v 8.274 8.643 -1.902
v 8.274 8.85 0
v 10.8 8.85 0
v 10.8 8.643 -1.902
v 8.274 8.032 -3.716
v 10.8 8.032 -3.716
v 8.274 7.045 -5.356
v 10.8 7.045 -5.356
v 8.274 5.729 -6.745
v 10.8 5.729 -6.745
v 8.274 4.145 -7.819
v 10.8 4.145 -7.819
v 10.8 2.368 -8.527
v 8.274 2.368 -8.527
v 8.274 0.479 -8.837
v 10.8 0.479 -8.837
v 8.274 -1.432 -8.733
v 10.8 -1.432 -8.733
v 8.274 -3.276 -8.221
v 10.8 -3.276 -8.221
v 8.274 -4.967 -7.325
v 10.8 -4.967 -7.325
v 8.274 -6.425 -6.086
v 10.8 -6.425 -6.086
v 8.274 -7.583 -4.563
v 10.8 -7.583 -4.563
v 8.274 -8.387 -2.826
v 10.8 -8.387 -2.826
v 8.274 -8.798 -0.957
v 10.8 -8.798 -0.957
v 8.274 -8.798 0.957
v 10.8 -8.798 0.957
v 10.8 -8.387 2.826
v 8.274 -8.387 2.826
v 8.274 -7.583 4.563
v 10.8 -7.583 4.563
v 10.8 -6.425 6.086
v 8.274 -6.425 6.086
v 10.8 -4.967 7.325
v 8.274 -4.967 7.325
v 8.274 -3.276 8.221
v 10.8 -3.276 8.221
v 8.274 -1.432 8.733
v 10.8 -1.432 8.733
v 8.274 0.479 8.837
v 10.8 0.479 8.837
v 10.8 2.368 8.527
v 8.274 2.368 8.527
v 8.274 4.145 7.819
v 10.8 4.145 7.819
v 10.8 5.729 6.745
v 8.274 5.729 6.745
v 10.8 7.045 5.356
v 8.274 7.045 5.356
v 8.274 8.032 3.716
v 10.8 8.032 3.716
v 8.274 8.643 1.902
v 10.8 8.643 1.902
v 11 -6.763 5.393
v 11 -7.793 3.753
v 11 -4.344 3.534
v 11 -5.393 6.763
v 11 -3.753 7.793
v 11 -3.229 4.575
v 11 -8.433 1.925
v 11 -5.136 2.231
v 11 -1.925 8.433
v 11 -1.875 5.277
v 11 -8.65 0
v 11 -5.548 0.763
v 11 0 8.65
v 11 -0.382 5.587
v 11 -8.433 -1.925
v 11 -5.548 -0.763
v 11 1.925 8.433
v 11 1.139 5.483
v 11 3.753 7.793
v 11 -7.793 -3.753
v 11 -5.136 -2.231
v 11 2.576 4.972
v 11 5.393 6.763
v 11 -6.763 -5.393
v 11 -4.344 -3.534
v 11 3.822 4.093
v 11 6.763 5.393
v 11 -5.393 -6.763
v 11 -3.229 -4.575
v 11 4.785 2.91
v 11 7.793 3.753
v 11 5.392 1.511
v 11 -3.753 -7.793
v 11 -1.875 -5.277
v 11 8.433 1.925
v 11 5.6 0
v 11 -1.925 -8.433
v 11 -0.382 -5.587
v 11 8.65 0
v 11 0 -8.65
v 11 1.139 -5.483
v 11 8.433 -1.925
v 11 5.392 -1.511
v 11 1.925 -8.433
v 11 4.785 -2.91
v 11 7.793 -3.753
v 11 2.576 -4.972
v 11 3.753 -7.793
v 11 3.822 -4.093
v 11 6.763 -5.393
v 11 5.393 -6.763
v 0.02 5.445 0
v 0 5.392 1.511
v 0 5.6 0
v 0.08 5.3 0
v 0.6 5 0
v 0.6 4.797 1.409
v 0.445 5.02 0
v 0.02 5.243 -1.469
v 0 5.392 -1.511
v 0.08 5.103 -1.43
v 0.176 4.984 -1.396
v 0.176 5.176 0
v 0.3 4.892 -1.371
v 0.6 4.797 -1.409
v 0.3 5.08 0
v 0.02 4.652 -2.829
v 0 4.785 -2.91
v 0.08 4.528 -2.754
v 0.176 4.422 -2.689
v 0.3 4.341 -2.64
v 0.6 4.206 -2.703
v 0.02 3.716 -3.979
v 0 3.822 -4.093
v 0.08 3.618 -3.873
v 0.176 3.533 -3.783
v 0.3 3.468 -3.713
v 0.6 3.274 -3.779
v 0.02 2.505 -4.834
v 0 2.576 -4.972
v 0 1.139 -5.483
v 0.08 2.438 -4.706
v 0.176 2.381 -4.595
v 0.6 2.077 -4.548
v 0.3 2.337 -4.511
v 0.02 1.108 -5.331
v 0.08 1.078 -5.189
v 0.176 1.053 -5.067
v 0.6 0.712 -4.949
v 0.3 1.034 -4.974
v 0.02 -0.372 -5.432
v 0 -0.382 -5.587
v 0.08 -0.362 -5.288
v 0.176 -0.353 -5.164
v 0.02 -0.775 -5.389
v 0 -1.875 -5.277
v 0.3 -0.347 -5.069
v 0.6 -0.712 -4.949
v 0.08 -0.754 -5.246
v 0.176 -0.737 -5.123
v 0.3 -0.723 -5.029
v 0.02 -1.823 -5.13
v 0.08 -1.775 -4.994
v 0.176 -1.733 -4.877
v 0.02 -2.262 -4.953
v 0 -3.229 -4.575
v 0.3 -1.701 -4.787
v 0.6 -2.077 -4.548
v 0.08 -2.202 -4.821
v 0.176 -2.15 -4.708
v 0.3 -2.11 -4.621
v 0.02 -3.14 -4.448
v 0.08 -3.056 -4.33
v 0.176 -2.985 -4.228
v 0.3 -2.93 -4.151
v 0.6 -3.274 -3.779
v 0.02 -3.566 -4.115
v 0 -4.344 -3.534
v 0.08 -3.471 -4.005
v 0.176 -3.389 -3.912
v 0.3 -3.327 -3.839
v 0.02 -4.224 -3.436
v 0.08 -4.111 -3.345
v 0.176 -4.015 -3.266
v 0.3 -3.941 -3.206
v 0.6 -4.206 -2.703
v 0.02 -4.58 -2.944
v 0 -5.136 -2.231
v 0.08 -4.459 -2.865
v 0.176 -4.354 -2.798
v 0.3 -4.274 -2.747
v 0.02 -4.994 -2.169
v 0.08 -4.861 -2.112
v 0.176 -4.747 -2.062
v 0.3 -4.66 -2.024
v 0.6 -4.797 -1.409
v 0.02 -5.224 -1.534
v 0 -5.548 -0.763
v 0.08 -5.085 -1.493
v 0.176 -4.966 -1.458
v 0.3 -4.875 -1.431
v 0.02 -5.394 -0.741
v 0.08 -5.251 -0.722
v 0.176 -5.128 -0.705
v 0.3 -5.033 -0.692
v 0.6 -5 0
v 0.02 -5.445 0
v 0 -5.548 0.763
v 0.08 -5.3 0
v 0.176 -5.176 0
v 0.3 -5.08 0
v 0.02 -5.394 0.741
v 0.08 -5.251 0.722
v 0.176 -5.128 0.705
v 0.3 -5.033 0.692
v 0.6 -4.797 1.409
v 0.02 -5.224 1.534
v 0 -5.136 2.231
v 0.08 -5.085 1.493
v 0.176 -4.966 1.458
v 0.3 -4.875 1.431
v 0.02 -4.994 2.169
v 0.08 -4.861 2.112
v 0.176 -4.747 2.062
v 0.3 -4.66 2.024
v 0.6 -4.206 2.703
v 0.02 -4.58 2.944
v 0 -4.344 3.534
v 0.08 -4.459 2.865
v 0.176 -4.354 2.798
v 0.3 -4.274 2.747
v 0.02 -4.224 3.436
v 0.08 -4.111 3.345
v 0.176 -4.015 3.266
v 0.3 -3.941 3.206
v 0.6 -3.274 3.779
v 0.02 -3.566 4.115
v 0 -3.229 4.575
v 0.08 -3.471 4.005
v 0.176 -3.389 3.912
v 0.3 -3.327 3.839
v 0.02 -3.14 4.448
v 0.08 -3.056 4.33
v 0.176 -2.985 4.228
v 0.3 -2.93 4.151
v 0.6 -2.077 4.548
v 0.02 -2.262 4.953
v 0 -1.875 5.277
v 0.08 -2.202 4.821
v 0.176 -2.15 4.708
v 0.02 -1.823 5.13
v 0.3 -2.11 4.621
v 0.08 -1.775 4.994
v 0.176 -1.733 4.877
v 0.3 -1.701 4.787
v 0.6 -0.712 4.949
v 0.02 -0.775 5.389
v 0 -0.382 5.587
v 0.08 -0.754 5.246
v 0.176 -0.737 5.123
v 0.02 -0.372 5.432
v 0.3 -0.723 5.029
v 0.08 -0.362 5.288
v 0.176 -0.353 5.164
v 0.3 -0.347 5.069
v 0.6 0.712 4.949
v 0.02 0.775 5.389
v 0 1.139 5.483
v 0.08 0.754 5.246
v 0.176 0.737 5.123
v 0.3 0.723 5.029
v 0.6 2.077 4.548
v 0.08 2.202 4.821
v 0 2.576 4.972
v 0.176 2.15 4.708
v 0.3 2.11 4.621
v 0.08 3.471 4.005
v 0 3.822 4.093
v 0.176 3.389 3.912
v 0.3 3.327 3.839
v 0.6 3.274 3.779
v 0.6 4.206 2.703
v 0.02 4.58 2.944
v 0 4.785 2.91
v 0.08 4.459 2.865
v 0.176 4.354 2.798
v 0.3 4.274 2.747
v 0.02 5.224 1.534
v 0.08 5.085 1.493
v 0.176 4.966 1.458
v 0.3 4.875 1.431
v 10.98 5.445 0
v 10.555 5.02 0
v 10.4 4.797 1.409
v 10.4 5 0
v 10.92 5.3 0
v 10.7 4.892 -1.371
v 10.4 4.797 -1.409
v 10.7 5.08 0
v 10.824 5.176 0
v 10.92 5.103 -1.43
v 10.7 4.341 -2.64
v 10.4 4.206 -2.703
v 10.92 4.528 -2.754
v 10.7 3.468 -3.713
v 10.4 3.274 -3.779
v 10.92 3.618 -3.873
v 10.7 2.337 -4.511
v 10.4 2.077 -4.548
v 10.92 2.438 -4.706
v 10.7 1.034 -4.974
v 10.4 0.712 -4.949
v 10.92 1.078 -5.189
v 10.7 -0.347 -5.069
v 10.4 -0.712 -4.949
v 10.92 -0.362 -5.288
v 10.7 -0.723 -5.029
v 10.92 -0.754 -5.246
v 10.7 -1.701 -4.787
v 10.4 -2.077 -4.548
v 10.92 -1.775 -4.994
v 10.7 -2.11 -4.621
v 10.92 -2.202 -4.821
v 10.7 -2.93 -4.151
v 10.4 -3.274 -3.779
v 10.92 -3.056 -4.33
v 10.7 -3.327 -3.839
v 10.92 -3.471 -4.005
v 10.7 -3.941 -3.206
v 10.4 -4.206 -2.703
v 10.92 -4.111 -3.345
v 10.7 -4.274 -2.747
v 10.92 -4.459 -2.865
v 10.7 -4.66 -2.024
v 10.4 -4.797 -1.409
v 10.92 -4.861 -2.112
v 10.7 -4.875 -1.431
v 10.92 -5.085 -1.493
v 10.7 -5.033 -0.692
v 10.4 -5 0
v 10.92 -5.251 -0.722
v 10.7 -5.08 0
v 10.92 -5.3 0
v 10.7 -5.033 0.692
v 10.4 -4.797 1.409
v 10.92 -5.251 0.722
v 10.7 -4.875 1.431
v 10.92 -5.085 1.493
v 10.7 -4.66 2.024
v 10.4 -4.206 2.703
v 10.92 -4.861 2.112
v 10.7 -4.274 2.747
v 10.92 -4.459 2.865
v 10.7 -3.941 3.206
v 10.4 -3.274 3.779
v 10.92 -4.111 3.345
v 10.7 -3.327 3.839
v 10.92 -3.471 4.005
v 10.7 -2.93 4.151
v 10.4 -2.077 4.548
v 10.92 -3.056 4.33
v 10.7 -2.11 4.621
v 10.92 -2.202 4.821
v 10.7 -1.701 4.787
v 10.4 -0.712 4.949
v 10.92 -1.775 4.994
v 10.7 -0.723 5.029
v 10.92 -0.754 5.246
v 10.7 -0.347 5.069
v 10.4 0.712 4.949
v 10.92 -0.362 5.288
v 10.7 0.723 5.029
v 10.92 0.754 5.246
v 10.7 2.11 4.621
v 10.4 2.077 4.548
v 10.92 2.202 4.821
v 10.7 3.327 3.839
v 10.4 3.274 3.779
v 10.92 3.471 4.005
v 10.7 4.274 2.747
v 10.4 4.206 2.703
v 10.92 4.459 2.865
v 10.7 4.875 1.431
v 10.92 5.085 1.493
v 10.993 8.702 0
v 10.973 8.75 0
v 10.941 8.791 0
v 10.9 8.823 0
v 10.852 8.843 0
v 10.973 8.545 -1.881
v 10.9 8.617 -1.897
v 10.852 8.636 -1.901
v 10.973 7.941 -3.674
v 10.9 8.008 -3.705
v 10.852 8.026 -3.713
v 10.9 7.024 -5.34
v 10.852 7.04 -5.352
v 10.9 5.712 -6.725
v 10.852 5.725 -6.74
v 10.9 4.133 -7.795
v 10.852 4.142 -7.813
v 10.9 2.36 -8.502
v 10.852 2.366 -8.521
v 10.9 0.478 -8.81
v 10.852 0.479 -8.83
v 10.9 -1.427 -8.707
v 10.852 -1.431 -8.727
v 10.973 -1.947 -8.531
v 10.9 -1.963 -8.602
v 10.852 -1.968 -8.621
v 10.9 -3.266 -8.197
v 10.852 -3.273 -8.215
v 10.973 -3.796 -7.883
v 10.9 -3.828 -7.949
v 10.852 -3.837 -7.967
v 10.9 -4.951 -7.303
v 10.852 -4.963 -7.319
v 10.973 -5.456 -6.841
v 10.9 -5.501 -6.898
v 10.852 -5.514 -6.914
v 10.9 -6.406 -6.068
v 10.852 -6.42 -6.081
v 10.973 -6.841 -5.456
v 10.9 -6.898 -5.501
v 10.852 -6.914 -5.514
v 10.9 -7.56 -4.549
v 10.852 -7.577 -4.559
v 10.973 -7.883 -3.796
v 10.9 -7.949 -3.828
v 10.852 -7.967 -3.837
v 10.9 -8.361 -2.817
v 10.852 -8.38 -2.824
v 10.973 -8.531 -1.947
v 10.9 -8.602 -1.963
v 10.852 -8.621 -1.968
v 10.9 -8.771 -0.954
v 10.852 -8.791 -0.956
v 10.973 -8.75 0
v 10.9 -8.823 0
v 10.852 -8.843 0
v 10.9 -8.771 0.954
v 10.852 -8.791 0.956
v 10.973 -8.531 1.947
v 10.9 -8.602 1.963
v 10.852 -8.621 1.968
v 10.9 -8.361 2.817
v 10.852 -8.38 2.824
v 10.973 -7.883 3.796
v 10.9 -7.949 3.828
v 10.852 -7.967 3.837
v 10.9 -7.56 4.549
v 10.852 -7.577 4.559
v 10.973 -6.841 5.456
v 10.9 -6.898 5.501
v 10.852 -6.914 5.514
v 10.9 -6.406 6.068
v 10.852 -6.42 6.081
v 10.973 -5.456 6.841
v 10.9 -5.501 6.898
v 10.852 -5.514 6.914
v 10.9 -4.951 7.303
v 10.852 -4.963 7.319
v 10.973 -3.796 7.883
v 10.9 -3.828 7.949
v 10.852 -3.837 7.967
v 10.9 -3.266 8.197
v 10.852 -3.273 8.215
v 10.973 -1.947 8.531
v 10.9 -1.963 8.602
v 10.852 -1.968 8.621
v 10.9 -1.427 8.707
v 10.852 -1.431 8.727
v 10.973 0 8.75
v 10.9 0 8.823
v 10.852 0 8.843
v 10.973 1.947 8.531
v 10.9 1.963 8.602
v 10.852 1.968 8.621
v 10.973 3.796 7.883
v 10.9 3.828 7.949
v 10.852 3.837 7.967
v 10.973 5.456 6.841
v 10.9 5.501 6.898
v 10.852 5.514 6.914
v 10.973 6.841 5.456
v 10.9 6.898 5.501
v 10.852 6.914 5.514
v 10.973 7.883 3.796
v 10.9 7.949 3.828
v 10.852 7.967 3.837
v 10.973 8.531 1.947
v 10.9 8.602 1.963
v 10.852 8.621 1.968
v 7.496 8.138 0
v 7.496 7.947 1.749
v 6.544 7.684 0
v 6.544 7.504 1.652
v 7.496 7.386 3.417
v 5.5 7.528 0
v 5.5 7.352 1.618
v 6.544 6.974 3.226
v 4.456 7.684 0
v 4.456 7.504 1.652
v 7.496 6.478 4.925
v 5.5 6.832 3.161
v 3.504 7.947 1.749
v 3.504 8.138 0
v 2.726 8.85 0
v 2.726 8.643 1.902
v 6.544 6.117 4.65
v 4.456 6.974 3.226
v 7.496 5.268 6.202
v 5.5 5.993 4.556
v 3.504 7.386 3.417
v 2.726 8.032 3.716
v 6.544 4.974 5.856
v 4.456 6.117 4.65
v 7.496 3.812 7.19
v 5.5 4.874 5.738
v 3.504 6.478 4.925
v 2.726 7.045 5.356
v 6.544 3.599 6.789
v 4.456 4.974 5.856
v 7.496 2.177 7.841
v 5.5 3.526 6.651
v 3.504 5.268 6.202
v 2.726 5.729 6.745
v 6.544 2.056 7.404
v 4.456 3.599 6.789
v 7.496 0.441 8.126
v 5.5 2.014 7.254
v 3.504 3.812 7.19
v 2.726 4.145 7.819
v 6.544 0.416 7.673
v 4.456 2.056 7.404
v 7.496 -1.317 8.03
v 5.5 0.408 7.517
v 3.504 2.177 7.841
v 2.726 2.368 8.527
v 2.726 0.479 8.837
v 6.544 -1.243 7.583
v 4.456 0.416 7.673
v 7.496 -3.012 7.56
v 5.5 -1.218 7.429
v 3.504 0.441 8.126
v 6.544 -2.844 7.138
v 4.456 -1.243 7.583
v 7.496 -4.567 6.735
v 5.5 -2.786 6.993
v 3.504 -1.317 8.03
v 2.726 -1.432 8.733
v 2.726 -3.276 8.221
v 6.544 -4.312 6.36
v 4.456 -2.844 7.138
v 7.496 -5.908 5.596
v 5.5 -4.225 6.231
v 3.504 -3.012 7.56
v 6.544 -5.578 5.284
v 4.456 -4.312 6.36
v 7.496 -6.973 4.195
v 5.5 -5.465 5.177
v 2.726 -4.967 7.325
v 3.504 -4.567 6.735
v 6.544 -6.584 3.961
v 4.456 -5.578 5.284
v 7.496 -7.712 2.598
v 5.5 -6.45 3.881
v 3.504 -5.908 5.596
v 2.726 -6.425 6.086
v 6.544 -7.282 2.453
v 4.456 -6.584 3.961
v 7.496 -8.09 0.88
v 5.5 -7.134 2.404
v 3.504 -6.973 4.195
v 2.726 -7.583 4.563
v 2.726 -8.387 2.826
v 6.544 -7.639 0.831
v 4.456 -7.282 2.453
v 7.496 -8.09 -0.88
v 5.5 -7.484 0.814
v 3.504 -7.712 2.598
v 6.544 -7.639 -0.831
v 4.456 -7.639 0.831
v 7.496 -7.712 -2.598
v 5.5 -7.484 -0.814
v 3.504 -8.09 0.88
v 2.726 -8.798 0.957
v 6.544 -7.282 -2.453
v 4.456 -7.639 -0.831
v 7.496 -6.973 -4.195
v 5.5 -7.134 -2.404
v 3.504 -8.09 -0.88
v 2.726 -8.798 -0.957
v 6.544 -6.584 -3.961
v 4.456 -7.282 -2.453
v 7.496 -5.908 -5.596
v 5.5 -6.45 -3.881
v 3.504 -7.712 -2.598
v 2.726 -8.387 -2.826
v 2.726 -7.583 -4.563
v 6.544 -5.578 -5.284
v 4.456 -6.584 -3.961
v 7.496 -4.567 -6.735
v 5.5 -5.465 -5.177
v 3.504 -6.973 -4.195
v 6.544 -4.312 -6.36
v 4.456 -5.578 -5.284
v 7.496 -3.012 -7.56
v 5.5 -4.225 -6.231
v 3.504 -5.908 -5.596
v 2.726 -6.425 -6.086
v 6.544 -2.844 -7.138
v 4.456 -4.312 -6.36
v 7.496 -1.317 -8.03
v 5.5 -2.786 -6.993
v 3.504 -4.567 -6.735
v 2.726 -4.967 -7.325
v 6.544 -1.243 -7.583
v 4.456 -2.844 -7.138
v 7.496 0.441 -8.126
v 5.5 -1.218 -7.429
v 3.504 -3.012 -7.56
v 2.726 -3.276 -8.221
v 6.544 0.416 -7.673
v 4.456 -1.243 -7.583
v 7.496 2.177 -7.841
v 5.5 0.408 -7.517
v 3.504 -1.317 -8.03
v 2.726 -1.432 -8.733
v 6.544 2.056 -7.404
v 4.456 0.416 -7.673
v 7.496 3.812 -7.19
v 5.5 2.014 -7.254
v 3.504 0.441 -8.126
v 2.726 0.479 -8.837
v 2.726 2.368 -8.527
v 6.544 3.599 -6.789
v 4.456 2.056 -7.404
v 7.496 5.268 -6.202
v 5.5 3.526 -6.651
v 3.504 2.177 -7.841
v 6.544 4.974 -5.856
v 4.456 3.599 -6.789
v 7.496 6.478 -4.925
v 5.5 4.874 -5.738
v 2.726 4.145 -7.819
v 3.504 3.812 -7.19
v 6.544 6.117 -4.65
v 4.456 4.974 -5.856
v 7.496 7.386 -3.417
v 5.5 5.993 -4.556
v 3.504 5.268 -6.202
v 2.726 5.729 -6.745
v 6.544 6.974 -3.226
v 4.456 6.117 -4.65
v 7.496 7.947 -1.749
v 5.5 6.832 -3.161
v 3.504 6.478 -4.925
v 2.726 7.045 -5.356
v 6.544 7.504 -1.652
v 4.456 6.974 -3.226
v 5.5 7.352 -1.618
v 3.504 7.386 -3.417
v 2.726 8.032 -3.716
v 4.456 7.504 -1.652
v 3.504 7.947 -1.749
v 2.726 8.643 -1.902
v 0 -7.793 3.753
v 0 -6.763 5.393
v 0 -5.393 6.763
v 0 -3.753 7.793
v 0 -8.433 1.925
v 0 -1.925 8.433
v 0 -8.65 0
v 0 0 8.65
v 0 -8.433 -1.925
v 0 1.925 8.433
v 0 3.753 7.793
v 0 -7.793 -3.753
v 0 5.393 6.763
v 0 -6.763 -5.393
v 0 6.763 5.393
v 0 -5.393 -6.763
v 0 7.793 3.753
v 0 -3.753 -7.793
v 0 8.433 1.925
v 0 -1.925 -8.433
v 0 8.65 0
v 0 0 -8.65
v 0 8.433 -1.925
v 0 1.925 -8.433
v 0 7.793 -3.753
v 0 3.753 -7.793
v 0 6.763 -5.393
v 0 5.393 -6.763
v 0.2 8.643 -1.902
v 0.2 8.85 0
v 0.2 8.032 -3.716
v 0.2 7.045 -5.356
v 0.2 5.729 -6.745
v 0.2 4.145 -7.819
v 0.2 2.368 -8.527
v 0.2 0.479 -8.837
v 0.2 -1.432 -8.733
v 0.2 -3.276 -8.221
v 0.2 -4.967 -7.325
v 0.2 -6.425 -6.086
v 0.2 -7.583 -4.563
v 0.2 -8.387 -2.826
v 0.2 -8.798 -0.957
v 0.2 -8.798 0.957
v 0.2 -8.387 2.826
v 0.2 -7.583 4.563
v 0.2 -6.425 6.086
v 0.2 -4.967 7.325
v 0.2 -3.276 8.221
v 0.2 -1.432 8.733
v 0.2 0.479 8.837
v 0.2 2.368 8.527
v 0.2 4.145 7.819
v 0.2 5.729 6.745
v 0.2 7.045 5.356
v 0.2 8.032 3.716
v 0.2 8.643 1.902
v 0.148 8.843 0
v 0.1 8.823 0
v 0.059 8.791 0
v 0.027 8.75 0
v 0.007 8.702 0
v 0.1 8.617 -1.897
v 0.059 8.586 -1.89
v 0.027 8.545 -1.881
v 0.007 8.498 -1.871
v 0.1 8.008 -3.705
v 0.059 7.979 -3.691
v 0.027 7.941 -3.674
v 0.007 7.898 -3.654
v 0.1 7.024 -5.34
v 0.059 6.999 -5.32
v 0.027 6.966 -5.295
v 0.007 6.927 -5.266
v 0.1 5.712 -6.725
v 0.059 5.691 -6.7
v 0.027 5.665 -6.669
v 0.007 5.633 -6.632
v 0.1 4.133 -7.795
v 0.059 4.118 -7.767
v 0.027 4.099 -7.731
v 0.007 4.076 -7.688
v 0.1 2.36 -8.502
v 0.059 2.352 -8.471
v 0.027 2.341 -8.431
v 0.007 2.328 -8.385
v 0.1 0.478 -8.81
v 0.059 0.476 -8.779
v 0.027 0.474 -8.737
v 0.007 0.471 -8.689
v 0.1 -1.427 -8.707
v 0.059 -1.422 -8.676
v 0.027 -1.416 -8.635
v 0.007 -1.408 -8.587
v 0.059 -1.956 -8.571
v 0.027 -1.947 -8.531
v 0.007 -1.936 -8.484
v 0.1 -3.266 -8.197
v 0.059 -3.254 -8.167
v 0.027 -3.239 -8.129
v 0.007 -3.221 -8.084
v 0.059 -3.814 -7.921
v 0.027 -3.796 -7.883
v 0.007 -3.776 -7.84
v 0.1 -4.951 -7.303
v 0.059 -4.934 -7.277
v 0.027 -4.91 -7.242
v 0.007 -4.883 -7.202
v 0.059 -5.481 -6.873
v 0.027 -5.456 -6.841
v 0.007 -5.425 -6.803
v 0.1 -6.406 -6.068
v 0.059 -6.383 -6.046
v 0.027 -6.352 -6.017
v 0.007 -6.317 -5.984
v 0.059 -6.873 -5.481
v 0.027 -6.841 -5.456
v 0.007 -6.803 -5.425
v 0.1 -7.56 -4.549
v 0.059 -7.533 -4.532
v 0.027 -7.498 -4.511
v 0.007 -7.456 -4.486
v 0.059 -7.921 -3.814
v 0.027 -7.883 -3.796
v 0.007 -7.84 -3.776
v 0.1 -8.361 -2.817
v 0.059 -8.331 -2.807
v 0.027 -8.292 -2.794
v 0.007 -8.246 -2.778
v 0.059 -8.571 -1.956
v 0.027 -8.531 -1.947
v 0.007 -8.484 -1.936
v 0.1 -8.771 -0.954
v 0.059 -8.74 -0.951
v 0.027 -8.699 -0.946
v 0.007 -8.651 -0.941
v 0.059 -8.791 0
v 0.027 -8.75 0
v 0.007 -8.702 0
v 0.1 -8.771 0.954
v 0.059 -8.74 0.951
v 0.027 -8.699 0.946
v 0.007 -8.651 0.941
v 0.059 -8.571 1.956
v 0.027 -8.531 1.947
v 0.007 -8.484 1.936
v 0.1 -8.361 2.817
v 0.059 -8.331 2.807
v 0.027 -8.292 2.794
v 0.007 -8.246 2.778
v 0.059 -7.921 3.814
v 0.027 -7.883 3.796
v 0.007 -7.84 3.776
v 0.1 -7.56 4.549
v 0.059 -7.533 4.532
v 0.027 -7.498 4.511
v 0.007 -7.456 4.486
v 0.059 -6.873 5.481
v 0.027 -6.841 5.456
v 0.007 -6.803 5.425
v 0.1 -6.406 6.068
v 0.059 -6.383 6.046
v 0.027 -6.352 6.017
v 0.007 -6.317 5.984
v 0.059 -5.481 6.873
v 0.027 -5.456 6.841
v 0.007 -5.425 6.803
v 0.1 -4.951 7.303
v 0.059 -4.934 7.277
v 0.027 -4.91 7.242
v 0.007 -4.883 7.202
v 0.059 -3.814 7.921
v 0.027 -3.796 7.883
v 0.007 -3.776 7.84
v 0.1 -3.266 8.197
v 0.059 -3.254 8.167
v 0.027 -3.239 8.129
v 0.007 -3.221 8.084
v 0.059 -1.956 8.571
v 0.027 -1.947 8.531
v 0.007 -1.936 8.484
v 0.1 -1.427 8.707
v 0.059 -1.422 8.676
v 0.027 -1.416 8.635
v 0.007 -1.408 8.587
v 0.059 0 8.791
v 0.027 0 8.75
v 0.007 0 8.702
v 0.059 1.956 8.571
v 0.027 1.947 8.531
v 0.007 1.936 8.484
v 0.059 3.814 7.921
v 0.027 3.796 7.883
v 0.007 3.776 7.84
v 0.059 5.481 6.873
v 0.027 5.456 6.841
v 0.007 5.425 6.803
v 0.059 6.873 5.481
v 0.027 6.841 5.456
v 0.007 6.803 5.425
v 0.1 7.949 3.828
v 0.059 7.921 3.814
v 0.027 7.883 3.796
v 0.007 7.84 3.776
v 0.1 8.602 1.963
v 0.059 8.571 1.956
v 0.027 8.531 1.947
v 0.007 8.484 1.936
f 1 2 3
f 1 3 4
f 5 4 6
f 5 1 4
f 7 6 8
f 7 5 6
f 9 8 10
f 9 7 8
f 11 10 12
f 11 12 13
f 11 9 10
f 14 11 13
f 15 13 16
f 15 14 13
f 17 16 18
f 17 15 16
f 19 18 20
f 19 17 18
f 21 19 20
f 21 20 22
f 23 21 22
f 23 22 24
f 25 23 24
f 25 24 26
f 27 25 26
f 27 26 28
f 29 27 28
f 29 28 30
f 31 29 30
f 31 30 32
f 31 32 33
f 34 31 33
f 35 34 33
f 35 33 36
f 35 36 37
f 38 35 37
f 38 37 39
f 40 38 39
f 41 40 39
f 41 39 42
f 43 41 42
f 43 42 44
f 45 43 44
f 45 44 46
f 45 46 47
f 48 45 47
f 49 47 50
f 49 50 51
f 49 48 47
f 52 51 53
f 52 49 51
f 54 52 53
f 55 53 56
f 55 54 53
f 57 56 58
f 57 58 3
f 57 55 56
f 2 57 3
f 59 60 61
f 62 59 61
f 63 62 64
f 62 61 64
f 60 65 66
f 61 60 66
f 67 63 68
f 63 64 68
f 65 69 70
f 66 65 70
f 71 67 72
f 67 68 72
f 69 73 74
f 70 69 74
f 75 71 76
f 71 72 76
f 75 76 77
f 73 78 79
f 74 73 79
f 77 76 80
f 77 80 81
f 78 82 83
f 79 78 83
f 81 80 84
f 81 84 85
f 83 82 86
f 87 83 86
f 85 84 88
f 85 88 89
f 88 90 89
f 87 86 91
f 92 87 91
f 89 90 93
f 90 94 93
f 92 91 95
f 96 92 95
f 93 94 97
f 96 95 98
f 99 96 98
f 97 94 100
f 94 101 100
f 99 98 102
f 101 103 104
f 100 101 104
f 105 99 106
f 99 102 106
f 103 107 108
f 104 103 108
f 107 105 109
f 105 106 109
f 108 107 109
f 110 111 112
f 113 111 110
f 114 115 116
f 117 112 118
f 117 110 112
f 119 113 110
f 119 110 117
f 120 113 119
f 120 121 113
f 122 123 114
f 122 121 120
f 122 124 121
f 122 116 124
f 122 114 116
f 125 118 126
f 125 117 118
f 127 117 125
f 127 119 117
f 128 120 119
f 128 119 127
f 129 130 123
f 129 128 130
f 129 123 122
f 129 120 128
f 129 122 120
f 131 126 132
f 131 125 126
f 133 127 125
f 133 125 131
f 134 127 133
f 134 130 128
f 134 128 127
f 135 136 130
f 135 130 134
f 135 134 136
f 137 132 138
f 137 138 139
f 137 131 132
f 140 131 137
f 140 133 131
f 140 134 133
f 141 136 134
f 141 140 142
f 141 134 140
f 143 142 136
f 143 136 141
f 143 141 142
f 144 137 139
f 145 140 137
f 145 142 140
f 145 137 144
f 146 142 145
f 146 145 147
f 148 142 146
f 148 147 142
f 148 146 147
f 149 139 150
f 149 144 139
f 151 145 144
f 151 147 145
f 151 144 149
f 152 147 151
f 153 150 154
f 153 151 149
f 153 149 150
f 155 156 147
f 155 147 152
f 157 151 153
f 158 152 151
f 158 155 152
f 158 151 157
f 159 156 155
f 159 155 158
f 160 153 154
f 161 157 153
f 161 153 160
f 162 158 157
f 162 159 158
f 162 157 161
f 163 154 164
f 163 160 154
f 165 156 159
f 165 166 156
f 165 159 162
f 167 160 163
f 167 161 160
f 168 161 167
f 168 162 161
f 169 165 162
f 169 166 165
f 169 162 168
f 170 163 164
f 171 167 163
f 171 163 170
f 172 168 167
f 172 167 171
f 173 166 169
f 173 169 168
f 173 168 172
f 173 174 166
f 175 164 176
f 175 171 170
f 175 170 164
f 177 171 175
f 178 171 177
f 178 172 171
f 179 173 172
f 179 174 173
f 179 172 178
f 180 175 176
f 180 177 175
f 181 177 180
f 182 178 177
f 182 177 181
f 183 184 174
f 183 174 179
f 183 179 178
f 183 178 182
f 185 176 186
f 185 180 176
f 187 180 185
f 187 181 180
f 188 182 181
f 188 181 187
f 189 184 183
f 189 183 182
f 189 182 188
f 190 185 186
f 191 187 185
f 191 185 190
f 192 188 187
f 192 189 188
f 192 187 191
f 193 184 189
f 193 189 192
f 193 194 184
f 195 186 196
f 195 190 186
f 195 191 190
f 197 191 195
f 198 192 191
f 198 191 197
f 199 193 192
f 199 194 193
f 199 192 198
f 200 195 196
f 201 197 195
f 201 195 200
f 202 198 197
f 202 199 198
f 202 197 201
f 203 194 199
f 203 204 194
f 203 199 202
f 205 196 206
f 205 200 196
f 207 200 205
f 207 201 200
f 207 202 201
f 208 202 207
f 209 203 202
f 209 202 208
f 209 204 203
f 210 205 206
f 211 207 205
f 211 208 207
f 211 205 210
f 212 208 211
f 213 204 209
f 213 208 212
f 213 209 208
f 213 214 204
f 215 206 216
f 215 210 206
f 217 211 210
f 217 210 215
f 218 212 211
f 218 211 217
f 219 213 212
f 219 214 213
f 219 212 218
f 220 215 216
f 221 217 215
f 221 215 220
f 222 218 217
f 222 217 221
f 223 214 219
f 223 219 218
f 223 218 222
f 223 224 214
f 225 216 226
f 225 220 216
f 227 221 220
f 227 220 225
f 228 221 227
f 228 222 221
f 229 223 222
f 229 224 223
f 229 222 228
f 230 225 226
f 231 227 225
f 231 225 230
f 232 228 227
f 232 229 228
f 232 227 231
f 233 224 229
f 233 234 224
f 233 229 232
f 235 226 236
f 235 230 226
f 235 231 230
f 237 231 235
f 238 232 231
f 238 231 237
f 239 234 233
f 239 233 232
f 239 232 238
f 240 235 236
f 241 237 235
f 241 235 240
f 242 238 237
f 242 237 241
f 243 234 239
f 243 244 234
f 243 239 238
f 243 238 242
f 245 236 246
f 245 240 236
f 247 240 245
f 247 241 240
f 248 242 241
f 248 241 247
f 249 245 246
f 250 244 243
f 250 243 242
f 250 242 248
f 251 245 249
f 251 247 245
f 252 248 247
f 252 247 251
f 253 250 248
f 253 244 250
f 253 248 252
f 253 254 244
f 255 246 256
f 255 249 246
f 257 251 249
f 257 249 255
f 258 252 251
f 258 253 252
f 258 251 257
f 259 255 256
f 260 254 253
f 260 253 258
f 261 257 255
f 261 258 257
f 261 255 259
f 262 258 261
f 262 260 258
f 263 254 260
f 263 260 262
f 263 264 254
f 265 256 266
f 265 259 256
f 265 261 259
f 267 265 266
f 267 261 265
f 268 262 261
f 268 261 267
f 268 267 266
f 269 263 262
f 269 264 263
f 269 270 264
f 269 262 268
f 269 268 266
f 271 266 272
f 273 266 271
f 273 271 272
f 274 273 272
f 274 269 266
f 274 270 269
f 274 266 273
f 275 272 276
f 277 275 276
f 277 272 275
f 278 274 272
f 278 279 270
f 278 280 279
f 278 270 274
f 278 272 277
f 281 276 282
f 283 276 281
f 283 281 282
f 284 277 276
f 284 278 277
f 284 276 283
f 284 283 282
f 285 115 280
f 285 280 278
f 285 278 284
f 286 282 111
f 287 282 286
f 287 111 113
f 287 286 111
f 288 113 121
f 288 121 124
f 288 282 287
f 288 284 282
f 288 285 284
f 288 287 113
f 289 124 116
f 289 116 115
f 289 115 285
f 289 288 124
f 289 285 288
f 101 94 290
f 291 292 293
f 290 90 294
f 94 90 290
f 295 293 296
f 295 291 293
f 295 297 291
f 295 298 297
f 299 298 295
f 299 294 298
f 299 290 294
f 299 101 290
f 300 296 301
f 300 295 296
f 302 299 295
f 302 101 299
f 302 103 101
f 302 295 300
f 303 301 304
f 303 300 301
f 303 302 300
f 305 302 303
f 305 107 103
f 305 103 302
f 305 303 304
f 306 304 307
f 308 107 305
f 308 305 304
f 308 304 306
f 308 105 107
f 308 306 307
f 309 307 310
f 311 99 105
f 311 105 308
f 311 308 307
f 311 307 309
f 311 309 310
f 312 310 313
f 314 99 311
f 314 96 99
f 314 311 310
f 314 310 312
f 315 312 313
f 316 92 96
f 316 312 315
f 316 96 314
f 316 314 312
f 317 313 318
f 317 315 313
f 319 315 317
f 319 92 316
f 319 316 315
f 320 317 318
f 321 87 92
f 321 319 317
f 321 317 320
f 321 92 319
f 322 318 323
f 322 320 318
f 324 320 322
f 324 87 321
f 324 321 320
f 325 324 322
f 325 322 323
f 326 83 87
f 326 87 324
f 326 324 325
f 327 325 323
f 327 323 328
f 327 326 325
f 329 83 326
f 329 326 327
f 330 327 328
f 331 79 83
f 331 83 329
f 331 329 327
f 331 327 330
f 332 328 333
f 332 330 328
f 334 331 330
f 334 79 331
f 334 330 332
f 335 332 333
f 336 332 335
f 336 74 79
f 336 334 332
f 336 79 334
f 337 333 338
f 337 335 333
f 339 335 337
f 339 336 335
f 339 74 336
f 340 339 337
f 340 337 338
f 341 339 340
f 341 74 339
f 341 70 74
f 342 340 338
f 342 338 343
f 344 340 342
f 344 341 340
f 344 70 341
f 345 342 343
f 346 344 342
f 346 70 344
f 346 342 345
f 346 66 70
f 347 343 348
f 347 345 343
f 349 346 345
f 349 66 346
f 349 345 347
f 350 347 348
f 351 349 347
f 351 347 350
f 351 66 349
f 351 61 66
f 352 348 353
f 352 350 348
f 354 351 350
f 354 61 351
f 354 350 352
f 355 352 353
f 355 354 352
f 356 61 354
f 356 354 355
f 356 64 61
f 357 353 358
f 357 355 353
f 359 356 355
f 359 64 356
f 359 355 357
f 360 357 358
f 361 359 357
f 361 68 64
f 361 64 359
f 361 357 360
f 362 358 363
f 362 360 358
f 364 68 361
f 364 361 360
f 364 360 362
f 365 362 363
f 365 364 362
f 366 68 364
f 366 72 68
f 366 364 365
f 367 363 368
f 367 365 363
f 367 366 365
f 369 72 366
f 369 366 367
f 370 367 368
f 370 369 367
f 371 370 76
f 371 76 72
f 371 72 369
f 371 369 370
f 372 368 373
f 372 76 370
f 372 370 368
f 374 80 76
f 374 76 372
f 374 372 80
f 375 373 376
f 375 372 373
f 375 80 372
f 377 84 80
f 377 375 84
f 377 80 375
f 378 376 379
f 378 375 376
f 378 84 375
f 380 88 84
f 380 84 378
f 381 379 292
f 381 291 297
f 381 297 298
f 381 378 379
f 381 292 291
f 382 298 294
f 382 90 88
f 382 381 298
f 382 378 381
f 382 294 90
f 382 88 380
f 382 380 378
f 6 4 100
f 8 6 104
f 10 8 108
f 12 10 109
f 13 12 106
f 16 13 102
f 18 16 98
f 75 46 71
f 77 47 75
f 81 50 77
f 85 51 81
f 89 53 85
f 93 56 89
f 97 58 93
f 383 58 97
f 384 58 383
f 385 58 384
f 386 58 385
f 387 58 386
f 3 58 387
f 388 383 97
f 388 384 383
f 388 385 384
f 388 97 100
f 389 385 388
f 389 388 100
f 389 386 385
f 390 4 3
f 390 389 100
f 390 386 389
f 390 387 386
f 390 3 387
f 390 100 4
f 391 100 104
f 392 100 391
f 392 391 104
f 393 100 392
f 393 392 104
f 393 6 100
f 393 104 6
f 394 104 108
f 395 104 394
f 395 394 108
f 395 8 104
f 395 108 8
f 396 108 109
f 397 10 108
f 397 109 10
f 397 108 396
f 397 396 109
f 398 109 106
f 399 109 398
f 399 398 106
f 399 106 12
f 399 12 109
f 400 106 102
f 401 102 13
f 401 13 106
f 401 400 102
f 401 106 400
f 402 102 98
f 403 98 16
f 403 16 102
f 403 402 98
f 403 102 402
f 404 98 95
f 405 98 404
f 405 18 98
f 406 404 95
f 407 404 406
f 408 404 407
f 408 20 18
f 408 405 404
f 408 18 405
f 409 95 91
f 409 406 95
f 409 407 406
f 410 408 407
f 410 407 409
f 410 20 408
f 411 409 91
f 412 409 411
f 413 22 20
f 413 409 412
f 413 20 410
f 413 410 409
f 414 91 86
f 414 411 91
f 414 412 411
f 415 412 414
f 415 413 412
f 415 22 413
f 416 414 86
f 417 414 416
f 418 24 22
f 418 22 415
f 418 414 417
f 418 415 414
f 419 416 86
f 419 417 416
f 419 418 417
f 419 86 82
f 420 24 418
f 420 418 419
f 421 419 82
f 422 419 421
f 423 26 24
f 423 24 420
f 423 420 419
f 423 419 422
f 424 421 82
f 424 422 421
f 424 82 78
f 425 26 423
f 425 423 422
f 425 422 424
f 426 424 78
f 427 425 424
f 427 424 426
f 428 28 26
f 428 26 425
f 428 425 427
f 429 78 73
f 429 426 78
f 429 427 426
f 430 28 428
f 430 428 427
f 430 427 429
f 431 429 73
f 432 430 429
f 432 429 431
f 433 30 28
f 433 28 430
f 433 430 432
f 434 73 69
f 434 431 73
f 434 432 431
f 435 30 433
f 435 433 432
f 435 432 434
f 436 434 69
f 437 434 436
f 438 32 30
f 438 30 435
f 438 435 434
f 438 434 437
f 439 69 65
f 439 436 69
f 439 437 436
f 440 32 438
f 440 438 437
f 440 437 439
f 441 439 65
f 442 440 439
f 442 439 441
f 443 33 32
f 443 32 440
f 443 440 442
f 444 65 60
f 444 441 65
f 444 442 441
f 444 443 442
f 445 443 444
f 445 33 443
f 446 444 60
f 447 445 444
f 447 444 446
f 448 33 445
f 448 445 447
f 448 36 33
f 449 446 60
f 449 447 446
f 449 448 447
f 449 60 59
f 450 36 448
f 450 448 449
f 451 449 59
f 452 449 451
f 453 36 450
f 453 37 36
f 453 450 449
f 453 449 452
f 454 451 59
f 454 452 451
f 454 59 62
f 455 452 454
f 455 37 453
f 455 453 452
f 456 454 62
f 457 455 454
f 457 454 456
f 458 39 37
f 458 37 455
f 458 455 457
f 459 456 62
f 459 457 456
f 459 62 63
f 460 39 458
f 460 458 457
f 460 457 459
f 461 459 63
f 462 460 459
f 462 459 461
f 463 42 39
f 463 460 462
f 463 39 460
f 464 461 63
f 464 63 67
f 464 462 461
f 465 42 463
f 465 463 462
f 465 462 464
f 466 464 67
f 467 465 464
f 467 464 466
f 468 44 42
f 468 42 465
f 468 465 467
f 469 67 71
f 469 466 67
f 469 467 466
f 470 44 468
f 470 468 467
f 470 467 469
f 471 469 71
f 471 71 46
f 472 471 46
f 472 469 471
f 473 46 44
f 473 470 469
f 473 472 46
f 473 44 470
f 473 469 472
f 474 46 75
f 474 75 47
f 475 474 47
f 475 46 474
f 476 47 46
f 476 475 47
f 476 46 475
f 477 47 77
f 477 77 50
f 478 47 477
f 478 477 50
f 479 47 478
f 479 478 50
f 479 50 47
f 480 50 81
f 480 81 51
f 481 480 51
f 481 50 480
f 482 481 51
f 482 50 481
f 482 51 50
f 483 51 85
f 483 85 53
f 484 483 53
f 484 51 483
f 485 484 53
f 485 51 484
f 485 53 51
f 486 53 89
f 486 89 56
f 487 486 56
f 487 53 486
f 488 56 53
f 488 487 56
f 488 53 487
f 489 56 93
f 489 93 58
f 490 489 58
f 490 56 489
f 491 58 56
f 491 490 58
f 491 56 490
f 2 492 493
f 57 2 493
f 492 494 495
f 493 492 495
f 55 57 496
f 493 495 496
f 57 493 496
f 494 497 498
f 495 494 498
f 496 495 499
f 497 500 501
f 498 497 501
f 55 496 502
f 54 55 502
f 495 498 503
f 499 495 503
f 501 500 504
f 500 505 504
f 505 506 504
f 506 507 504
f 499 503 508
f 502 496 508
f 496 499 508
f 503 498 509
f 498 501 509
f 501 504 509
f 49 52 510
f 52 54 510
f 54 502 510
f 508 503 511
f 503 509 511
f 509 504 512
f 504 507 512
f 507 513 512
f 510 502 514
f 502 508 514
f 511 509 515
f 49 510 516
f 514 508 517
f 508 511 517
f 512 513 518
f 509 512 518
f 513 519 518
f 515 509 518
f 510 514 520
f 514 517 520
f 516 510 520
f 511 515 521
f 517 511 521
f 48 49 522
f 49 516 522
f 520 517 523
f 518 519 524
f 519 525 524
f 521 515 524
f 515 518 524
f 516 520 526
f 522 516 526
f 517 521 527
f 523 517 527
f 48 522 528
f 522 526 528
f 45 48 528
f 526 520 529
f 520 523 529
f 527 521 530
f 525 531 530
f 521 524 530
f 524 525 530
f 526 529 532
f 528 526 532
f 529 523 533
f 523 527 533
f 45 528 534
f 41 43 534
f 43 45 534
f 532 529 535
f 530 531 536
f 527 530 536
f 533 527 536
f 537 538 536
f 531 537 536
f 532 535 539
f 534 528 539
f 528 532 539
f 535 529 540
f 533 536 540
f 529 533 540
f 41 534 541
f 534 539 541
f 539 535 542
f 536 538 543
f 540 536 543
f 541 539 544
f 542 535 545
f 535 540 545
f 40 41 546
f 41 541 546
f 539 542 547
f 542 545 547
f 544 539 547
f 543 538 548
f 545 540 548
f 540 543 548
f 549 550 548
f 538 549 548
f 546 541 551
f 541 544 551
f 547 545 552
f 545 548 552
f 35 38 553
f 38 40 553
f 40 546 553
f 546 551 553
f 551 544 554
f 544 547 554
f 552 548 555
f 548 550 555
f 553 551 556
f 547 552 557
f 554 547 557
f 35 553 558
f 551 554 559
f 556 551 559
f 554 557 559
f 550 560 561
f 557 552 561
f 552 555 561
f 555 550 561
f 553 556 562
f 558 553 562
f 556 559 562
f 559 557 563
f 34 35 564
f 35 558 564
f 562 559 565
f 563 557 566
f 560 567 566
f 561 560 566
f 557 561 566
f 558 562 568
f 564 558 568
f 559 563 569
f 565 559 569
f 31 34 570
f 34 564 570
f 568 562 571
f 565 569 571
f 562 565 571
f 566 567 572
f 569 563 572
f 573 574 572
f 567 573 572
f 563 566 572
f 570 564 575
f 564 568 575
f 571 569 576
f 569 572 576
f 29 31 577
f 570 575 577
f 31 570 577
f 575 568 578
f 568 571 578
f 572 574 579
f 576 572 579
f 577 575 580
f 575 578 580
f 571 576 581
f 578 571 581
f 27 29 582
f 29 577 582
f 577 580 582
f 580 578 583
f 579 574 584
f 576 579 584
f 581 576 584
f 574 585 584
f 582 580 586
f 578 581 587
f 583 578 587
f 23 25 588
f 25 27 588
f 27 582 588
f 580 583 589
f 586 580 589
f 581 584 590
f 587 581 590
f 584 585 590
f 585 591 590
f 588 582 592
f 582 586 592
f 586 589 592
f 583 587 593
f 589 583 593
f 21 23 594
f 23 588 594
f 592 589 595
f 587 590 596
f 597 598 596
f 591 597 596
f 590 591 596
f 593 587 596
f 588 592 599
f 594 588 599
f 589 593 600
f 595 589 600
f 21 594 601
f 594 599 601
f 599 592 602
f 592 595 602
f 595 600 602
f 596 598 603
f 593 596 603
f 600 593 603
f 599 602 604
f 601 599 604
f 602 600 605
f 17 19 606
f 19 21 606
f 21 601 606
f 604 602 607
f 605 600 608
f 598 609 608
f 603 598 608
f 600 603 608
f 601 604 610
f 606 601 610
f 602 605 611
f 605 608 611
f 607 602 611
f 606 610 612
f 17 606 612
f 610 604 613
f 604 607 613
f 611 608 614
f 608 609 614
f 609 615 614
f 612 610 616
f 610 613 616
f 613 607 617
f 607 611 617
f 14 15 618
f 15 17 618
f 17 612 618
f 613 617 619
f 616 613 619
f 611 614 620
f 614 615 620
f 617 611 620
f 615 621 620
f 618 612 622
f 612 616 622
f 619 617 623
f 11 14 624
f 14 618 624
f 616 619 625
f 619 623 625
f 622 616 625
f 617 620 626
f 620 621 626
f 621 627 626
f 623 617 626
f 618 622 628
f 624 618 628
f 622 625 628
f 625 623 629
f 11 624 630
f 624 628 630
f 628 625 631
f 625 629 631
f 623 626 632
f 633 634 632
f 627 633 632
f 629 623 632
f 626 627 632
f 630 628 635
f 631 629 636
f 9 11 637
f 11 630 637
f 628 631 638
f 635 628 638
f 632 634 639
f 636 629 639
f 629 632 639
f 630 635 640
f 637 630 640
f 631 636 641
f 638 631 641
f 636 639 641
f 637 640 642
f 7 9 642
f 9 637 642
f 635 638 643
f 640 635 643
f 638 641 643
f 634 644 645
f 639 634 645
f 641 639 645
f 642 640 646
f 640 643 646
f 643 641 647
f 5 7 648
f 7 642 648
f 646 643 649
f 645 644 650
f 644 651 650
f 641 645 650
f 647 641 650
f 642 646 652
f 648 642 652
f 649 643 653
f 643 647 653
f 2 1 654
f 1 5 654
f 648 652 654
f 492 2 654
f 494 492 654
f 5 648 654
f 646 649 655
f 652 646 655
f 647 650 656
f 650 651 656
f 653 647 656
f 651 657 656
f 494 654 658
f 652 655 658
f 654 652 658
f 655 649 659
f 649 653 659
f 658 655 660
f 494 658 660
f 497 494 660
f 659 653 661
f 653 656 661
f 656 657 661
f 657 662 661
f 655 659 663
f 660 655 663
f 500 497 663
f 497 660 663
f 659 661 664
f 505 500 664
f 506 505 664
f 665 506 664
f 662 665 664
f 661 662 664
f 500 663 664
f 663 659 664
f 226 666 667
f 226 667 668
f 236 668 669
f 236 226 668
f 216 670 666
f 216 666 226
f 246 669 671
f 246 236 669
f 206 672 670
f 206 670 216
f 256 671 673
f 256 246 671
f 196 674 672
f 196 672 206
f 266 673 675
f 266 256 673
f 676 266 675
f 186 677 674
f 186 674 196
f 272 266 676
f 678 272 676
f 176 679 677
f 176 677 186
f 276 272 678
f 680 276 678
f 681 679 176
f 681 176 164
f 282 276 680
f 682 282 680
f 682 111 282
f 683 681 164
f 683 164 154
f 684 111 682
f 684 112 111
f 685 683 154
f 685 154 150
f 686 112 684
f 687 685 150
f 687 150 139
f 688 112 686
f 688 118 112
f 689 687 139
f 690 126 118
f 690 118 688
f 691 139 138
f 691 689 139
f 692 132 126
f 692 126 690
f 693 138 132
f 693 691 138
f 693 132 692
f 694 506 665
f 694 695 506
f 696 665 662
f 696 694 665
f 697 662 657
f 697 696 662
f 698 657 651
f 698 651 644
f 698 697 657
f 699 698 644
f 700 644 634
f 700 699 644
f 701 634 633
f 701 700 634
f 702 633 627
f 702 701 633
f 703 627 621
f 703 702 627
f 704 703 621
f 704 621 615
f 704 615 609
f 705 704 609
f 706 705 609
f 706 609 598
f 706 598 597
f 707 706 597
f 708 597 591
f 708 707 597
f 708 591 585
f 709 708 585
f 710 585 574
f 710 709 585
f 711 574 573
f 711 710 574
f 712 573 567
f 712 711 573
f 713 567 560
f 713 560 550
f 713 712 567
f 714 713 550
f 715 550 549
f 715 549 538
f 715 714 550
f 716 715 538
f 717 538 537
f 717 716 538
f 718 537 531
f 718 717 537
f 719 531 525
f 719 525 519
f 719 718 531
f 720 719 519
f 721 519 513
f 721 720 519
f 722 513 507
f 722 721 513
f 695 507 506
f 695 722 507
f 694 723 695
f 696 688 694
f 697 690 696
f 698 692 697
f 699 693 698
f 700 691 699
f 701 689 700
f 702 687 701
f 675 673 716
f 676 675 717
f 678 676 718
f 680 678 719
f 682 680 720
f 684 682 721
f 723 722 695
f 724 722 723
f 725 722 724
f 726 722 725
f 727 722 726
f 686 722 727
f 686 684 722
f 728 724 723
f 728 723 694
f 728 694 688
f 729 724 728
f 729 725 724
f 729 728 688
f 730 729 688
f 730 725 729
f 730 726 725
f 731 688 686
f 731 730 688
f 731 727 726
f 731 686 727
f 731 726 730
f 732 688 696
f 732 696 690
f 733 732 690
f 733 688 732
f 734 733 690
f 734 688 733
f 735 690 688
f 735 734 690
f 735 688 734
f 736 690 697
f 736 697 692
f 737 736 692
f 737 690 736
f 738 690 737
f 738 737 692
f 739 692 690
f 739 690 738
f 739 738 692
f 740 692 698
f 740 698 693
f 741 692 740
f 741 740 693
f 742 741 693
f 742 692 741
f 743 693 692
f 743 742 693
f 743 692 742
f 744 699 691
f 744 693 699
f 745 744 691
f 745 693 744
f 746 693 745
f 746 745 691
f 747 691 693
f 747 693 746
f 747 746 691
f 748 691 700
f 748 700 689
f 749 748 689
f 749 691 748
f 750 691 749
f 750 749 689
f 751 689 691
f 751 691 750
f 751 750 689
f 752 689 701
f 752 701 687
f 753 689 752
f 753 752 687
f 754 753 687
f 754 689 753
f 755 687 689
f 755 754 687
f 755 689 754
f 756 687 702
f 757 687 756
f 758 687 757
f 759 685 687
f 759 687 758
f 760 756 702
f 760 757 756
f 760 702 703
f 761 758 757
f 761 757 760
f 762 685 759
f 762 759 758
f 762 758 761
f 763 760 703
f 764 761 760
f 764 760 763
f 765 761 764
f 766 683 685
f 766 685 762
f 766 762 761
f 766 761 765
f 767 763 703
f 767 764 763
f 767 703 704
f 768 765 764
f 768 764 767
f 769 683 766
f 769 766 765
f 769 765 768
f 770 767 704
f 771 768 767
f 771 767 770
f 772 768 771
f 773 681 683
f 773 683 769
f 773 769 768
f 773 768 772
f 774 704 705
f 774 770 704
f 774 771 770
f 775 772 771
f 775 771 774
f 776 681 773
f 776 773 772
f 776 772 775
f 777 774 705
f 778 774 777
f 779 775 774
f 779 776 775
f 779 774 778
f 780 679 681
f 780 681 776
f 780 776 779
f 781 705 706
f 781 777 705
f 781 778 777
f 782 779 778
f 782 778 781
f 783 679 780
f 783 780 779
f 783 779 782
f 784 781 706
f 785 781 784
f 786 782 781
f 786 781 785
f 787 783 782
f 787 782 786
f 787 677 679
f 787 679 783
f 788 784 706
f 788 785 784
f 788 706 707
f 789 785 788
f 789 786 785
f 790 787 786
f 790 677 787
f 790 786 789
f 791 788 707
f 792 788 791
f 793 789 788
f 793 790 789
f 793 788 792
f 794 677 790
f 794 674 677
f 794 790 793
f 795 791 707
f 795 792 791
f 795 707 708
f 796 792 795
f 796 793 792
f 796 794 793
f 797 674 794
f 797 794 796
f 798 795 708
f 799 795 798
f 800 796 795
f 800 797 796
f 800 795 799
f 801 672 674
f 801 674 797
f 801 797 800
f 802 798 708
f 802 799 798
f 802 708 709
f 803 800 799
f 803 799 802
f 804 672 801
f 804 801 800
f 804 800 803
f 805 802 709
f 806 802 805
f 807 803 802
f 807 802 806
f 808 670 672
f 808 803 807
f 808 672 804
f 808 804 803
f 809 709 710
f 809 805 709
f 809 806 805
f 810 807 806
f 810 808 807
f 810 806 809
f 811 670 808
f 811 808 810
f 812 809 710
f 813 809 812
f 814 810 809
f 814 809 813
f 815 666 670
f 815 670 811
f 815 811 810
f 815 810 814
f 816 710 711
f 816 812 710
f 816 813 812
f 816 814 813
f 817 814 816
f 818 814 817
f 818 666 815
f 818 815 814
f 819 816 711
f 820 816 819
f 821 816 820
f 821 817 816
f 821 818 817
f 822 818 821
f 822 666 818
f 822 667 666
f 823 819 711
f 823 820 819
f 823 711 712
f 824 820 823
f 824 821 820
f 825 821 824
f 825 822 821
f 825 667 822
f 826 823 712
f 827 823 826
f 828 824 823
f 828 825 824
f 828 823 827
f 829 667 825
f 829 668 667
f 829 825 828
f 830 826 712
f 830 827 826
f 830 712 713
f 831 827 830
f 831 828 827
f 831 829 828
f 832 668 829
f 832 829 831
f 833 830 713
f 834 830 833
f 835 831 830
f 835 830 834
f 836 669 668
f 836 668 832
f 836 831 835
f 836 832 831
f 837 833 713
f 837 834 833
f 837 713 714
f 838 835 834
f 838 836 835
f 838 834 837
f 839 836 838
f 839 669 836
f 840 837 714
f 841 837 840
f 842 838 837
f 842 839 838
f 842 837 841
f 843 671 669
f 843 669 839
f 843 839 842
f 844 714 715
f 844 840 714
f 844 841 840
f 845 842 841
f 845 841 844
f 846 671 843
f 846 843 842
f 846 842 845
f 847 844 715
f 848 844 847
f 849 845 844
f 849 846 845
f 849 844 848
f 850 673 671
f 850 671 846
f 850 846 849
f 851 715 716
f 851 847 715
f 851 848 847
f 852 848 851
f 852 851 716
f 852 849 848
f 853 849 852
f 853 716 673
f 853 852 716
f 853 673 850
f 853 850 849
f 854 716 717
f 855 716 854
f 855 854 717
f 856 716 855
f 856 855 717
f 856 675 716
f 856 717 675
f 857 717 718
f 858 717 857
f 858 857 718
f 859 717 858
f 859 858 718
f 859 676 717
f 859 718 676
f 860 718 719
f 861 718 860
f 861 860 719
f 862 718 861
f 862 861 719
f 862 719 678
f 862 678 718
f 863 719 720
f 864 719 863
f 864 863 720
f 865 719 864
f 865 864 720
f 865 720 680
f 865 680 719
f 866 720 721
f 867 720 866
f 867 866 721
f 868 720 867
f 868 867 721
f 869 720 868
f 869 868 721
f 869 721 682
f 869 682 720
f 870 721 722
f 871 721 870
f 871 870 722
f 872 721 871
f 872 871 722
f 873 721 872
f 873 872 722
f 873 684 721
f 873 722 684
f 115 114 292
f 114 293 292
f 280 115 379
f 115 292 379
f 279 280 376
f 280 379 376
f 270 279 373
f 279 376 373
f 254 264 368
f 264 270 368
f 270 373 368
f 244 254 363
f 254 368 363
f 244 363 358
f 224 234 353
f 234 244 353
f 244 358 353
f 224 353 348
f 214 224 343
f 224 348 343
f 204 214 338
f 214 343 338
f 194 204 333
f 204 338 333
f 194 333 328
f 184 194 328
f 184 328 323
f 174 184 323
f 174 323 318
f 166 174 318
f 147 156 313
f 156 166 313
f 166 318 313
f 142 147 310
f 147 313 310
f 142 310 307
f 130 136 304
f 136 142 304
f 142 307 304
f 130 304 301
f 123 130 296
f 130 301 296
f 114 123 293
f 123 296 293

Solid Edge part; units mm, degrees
sketch "Sketch1" plane through (0, 0, 0) normal (0, 0, 1) x (1, 0, 0)
  arc A0 (0, 5.6) -> (0.6, 5) centre (0.6, 5.6) ccw
  line L0 (0.6, 5) -> (10.4, 5)
  arc A1 (10.4, 5) -> (11, 5.6) centre (10.4, 5.6) ccw
  line L1 (11, 5.6) -> (11, 8.65)
  arc A2 (11, 8.65) -> (10.8, 8.85) centre (10.8, 8.65) ccw
  line L2 (10.8, 8.85) -> (8.2743, 8.85)
  arc A3 (8.2743, 8.85) -> (2.7257, 8.85) centre (5.5, 11.1) cw
  line L3 (2.7257, 8.85) -> (0.2, 8.85)
  arc A4 (0.2, 8.85) -> (0, 8.65) centre (0.2, 8.65) ccw
  line L4 (0, 8.65) -> (0, 5.6)
revolve "RevolvedProtrusion1" add sketch "Sketch1" angle 360 about axis through (10.4, 0, 0) along (-1, 0, 0)
properties material "Steel"
